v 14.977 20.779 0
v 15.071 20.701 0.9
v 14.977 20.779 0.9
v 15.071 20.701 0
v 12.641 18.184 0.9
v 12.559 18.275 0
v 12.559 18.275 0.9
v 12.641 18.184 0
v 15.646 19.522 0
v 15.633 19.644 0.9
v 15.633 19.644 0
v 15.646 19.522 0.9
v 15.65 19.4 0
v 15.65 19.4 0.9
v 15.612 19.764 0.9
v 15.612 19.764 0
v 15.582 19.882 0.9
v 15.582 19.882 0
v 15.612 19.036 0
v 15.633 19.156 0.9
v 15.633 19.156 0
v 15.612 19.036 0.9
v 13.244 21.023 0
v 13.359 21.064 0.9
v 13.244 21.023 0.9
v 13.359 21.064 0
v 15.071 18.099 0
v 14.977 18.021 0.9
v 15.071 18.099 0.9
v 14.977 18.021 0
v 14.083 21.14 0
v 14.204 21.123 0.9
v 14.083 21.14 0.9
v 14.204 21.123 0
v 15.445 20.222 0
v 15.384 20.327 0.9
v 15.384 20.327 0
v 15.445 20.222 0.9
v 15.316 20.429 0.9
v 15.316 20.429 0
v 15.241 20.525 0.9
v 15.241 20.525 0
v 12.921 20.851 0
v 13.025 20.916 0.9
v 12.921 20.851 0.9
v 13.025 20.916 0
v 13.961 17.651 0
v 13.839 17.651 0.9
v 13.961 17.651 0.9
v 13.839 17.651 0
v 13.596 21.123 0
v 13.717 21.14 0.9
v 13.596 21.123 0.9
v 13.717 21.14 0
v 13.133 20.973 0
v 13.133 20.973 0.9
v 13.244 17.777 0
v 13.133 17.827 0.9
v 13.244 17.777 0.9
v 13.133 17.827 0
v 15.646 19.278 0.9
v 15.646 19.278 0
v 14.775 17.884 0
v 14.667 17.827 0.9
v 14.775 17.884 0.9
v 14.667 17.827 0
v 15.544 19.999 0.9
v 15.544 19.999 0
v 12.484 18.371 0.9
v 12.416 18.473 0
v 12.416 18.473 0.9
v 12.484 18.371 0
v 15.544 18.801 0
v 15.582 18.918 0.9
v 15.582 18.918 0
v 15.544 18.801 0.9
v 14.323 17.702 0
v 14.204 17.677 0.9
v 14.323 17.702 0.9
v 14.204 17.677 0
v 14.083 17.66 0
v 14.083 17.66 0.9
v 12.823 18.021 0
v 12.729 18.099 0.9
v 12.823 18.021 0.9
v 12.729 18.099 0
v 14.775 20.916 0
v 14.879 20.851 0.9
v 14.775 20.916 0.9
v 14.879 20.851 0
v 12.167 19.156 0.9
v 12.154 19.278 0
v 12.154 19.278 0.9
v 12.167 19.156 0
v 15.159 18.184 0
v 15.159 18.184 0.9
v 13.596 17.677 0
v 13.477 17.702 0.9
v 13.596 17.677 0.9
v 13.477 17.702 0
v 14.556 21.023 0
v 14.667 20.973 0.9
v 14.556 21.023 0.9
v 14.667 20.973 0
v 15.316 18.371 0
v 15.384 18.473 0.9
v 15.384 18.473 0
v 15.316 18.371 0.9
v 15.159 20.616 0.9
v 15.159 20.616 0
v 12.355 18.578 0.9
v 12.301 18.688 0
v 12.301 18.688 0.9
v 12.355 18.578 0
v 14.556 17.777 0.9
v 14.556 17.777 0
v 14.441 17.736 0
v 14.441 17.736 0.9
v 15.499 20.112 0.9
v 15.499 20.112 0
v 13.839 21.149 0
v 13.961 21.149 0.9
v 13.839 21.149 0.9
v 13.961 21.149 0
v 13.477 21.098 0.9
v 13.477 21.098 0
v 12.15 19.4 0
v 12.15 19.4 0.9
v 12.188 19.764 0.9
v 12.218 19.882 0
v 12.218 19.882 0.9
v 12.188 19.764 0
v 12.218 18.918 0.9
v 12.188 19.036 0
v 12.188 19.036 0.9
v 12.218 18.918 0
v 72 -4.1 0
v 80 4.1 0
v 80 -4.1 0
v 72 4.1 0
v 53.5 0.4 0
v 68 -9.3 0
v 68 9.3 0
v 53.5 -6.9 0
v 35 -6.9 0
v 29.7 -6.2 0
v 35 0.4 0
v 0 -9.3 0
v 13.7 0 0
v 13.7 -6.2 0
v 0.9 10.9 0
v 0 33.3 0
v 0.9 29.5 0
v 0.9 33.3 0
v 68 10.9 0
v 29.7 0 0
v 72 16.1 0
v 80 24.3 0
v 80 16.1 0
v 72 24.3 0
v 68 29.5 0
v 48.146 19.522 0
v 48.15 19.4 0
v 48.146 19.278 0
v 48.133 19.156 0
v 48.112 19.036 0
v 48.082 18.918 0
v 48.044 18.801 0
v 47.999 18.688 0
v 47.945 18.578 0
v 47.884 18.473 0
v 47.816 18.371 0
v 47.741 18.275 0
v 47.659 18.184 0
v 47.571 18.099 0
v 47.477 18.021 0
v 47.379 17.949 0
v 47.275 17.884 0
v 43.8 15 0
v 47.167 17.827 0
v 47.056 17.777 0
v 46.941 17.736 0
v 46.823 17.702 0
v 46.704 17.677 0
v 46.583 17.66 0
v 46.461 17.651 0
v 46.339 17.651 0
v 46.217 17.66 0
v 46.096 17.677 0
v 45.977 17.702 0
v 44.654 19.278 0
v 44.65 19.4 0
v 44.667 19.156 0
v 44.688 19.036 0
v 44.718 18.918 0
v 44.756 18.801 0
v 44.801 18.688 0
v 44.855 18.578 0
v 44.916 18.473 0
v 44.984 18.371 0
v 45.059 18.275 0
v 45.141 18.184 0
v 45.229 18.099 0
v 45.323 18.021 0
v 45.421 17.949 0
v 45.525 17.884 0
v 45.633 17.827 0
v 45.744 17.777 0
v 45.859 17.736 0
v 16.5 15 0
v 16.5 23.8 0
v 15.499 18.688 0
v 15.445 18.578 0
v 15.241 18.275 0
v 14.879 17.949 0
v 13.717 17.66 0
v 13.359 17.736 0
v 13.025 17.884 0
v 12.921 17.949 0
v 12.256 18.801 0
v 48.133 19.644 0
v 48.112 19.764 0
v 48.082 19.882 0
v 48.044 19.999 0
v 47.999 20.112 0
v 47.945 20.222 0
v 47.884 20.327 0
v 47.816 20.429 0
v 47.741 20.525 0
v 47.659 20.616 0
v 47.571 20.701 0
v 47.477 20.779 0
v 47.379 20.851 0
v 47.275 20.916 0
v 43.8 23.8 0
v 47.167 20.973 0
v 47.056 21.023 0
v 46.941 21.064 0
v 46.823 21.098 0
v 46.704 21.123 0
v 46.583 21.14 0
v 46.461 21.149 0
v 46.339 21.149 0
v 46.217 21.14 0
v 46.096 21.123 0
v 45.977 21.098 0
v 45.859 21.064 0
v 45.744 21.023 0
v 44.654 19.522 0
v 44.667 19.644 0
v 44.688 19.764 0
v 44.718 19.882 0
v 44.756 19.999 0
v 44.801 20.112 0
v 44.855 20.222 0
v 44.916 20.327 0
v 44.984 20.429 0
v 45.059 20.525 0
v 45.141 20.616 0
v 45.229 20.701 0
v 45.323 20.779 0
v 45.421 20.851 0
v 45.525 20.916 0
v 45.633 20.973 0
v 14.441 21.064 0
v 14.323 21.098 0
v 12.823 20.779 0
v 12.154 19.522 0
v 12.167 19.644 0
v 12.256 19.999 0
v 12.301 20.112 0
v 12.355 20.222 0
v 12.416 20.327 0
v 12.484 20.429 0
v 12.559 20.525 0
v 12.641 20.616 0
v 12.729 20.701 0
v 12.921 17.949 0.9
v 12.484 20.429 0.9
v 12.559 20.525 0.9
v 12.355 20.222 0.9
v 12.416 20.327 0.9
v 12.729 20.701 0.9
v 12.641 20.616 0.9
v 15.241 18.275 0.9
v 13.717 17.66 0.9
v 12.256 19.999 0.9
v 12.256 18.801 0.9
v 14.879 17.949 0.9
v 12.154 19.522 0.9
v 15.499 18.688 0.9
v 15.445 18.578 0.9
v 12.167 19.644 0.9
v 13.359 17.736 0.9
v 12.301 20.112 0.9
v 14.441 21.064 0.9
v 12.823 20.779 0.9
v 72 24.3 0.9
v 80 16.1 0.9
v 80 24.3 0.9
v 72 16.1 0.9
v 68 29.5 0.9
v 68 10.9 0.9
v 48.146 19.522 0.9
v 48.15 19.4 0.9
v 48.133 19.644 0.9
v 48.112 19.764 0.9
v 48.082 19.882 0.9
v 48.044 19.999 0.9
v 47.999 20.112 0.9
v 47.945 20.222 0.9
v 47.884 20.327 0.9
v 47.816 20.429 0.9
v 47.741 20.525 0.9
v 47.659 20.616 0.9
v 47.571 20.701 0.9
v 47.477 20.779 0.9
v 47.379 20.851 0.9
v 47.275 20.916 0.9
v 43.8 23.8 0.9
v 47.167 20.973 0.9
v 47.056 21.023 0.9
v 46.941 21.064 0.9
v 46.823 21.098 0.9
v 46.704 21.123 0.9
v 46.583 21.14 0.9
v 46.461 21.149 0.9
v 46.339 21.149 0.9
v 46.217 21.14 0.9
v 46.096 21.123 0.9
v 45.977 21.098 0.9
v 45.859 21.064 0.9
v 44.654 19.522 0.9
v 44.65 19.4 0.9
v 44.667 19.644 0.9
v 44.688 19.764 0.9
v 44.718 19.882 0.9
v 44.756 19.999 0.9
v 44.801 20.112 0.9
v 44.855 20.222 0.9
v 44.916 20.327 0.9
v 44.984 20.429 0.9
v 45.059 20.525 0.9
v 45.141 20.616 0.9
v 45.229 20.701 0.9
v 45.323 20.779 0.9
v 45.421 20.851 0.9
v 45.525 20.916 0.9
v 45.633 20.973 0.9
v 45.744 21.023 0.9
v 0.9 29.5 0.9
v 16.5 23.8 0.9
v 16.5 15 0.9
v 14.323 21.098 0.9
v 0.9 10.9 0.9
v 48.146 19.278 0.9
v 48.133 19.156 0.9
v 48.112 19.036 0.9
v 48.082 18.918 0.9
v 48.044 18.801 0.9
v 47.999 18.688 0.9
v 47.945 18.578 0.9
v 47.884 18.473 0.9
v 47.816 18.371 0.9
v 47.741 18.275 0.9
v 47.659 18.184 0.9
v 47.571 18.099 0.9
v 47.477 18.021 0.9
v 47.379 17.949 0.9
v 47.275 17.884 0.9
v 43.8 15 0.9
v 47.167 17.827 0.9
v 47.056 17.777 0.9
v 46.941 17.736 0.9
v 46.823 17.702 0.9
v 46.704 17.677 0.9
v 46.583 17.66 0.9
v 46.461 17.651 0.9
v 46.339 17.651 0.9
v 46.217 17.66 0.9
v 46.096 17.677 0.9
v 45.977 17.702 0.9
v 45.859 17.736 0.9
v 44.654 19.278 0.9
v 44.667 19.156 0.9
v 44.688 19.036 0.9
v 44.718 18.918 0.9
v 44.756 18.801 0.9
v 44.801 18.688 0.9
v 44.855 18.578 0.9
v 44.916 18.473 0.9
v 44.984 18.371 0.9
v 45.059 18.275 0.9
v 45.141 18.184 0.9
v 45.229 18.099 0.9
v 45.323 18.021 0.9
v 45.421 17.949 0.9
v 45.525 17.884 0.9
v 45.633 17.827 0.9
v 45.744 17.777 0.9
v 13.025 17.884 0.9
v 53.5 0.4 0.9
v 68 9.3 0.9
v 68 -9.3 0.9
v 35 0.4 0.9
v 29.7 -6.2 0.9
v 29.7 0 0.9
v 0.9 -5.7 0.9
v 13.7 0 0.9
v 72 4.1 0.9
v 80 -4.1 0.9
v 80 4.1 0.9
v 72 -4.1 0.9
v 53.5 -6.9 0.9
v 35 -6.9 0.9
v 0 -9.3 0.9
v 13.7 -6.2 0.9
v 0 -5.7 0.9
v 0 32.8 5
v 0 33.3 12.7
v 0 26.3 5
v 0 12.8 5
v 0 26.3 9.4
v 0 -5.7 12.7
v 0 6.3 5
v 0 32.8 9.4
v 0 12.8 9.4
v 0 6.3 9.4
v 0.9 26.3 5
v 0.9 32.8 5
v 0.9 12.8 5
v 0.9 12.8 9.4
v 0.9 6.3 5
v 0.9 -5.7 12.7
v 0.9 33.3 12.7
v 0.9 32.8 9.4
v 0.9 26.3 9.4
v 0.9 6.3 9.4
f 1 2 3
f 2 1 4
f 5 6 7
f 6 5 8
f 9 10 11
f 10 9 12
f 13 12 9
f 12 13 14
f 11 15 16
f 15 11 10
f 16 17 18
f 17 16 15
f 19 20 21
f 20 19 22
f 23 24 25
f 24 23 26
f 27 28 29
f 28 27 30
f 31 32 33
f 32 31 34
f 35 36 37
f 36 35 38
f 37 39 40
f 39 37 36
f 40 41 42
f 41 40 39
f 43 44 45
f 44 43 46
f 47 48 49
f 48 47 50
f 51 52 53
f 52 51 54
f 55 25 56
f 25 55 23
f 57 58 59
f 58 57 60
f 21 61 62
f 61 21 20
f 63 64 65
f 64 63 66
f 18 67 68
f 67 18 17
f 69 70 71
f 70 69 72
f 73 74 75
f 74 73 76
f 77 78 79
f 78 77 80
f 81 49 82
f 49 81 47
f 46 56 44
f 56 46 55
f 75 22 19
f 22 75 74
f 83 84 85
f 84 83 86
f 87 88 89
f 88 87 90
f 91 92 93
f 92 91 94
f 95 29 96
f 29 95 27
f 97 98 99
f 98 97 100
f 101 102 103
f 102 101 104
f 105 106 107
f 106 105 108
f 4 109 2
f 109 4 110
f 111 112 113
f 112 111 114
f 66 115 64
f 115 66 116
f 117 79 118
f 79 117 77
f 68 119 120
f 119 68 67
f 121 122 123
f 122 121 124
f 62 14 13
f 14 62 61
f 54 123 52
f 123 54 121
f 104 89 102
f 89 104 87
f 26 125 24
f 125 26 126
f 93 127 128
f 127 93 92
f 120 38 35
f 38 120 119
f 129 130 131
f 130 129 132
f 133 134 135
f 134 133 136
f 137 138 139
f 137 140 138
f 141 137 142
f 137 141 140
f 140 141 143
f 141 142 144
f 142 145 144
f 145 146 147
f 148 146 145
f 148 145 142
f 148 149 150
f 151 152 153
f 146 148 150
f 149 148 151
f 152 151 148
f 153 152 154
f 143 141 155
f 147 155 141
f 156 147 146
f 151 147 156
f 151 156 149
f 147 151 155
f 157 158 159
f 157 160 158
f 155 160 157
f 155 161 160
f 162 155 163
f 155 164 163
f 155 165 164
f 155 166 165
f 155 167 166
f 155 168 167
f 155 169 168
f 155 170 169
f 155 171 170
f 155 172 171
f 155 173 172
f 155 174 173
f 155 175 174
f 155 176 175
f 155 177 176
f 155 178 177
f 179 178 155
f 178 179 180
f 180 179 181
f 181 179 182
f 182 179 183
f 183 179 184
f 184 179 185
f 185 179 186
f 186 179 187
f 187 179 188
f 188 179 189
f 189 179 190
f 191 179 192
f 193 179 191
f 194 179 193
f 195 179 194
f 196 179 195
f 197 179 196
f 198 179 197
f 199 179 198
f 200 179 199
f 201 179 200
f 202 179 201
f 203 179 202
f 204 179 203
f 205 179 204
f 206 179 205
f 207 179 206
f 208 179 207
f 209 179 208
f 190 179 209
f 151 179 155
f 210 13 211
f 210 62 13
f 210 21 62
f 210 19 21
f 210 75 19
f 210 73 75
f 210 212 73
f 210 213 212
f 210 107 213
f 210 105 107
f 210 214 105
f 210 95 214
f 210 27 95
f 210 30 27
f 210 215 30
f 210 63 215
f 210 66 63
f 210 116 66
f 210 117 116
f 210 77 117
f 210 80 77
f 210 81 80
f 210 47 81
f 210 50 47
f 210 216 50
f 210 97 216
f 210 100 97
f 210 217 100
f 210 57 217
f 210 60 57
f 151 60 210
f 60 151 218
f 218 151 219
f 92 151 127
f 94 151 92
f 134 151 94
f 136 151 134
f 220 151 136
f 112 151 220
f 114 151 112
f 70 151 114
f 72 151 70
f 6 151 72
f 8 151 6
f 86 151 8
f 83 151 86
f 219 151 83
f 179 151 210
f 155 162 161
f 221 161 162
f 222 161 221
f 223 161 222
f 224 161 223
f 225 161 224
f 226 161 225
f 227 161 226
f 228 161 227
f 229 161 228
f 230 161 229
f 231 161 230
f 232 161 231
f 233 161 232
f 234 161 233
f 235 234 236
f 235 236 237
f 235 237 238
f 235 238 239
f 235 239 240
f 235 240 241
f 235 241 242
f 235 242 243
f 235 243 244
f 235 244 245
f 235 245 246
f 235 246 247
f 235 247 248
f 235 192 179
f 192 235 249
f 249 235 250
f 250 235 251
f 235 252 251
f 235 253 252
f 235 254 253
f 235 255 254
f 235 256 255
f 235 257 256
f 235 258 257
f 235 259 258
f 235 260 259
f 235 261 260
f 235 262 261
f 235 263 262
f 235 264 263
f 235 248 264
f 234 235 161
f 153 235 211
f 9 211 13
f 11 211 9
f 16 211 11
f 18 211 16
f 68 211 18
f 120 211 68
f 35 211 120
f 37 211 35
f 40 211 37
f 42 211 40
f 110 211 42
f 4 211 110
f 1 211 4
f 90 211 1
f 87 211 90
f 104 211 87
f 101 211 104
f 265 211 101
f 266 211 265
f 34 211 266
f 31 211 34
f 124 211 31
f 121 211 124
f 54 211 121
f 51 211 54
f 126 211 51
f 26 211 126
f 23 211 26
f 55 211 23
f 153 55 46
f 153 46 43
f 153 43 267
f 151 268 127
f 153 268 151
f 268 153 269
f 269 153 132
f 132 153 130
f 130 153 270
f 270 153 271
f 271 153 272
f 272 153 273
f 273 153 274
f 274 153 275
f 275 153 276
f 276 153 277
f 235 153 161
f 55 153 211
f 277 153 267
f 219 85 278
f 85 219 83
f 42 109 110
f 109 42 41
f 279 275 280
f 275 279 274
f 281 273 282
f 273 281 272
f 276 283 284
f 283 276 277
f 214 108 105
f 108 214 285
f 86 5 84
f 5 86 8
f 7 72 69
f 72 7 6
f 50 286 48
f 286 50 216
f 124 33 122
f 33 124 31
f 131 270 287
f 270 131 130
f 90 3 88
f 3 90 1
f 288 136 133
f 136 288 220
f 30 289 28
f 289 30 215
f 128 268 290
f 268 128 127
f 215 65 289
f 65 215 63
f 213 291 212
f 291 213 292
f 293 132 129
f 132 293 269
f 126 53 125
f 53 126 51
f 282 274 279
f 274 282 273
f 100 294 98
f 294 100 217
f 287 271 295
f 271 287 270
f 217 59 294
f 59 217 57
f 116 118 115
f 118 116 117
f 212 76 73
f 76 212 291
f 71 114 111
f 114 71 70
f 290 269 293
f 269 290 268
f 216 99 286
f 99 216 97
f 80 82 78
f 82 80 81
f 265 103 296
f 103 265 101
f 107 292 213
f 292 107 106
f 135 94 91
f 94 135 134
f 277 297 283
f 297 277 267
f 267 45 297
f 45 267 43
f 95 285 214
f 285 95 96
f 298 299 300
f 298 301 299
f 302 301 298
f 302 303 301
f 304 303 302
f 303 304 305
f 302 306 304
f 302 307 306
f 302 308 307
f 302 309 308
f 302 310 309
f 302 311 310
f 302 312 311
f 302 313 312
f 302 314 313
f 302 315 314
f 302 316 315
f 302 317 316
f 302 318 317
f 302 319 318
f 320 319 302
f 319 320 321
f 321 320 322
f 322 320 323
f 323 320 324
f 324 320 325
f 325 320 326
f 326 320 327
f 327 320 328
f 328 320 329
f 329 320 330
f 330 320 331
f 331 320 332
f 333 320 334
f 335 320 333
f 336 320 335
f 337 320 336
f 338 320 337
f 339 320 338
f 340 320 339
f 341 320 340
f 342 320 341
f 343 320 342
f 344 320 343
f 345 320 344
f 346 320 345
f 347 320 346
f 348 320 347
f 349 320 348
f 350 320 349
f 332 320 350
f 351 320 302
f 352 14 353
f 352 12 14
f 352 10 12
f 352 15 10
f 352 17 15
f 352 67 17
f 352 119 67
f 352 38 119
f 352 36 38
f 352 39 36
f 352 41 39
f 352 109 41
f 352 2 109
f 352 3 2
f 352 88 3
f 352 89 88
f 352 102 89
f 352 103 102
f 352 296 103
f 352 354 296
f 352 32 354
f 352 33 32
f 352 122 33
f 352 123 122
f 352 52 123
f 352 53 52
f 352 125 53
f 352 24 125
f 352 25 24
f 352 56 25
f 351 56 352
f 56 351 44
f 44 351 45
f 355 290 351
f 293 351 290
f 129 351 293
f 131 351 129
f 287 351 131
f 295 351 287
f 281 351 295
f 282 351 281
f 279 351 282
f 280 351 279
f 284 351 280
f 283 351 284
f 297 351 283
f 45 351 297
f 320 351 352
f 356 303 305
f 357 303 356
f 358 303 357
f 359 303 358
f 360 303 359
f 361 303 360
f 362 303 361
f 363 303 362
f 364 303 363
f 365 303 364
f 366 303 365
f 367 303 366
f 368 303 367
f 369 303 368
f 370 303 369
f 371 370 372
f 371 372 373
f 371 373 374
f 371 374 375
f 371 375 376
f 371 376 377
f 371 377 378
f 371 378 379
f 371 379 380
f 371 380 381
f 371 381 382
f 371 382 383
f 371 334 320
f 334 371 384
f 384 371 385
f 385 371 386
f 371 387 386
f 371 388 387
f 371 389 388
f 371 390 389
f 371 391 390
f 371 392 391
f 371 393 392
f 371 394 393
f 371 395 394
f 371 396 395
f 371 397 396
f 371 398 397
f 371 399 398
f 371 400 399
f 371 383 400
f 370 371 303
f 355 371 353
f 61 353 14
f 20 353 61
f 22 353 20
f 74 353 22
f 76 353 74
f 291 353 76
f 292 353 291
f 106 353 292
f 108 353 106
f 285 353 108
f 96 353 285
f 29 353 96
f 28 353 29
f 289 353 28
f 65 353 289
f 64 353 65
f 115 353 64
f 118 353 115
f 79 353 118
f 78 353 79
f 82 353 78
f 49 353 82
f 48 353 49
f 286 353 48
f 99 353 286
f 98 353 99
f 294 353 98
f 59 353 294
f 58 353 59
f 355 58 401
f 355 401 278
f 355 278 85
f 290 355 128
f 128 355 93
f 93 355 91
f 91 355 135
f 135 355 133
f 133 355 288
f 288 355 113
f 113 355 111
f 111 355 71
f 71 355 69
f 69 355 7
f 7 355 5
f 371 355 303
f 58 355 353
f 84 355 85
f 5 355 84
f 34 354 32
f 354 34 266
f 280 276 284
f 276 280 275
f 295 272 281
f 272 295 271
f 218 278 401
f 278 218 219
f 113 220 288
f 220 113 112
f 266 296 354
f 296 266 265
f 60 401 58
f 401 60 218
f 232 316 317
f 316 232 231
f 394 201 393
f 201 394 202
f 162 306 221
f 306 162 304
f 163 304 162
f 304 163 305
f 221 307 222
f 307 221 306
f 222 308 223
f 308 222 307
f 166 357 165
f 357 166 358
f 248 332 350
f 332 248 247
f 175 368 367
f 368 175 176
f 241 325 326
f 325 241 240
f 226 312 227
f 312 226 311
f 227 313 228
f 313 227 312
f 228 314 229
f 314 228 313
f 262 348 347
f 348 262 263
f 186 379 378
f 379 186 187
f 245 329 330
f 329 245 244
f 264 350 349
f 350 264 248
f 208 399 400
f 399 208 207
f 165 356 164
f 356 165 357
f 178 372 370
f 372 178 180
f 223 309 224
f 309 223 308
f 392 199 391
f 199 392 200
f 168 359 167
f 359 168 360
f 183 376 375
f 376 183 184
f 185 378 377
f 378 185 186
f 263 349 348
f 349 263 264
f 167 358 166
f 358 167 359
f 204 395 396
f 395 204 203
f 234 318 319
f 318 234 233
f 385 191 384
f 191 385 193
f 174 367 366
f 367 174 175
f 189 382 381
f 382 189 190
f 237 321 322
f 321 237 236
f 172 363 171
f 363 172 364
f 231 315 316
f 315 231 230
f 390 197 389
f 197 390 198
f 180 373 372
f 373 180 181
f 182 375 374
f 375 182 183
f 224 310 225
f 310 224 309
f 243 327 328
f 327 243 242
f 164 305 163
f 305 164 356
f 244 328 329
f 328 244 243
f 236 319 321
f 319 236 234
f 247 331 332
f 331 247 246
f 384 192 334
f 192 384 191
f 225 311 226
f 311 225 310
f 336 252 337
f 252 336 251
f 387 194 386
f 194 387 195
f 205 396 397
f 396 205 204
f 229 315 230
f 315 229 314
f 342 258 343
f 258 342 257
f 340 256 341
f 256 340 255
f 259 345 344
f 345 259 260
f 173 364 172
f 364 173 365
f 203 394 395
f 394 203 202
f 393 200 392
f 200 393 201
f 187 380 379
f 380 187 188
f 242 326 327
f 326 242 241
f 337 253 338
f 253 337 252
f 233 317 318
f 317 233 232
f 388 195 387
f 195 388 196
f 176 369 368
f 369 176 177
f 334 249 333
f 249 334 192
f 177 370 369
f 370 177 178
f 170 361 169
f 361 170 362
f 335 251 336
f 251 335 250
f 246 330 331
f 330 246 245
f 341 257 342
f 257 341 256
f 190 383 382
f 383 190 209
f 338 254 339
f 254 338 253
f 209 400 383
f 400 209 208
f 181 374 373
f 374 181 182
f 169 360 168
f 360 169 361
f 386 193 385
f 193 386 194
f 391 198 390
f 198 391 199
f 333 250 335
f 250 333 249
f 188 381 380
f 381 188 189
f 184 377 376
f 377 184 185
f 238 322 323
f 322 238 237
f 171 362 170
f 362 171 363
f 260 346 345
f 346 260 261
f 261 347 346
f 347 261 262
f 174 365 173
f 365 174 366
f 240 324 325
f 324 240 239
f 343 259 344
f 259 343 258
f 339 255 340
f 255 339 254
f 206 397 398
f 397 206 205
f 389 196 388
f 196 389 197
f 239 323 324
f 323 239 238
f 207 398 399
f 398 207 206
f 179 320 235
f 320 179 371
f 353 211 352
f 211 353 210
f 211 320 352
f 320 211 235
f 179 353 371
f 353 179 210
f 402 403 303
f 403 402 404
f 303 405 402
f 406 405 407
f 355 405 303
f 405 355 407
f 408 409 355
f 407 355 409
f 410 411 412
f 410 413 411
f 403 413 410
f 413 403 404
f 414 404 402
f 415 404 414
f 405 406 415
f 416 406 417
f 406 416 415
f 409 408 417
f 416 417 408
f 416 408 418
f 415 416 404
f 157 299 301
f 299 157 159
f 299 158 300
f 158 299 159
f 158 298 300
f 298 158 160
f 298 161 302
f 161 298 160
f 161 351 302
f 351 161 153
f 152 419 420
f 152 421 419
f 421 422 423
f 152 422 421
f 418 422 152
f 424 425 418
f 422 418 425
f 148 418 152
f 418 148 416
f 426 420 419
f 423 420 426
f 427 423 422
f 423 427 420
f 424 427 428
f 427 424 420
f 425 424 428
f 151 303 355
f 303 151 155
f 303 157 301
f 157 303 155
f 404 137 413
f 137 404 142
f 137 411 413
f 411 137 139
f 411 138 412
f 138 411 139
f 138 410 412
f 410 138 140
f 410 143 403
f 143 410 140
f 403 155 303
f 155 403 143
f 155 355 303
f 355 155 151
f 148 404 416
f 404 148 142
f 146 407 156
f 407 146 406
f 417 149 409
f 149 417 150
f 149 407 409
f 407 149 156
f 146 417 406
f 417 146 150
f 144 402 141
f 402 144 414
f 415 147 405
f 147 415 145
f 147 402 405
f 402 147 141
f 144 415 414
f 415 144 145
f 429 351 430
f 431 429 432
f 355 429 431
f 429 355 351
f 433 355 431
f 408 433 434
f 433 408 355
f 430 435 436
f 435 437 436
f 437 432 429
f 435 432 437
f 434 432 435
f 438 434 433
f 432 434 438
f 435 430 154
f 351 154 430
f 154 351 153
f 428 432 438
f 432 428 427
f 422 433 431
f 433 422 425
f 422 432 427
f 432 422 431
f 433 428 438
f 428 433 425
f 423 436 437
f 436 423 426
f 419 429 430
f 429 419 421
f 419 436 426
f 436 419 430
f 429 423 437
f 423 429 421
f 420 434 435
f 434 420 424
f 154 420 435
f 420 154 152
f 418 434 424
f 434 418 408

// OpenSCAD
$fn = 90;
thickness = 0.9;

/********************/
/*!!!!!!!!!!!!!!!!!!*/
//TODO:
//- Die Löcher für die Anschlüsse müssen noch ein paar Millimeter weiter nach unten im Gehäuse (siehe Gehäuse)
//- Der "Pfeiler" im Querteil ist zu klein und wird nicht gedruckt, dadurch druckt er dort in die Luft.
//- Beim nächsten Druck leitfähiges Filament verwenden


base();
side();

module side(){
	translate([0, -5.7, 0]){
		difference(){
			cube([thickness, 39, 12.7]);
			translate([0, 0, 5]){
				for(y = [12,32]){
					translate([0, y, 0])
						#cube([thickness, 6.5, 4.4]);
				}
			}
		}
	}
}

module base(){
	difference(){
		base_double();

		translate([16.5, 15, 0]){
			#cube([27.3, 8.8, thickness]);
			for(x = [-2.6, 29.9]){
				translate([x, 4.4, 0])
					#cylinder(d=3.5, h=thickness);
			}
		}
		
		translate([13.7, -6.2, 0]){
			#cube([16, 6.2, thickness]);
		}
		
		translate([35, -6.9, 0]){
			#cube([18.5, 7.3, thickness]);
		}
	}
}

module base_double(){
		linear_extrude(thickness, convexity=10){
			base_full();
			translate([0, 20.2]){
				base_full();
			}
			translate([0, 9.3]){
				square([68, 1.6]);
			}
		}
}

module base_full(){
	base_half();
	mirror([0, 1, 0])
		base_half();
}

module base_half(){
	polygon([[0,0],[80,0],[80,4.1],[72,4.1],[68,9.3],[0,9.3]]);
}
